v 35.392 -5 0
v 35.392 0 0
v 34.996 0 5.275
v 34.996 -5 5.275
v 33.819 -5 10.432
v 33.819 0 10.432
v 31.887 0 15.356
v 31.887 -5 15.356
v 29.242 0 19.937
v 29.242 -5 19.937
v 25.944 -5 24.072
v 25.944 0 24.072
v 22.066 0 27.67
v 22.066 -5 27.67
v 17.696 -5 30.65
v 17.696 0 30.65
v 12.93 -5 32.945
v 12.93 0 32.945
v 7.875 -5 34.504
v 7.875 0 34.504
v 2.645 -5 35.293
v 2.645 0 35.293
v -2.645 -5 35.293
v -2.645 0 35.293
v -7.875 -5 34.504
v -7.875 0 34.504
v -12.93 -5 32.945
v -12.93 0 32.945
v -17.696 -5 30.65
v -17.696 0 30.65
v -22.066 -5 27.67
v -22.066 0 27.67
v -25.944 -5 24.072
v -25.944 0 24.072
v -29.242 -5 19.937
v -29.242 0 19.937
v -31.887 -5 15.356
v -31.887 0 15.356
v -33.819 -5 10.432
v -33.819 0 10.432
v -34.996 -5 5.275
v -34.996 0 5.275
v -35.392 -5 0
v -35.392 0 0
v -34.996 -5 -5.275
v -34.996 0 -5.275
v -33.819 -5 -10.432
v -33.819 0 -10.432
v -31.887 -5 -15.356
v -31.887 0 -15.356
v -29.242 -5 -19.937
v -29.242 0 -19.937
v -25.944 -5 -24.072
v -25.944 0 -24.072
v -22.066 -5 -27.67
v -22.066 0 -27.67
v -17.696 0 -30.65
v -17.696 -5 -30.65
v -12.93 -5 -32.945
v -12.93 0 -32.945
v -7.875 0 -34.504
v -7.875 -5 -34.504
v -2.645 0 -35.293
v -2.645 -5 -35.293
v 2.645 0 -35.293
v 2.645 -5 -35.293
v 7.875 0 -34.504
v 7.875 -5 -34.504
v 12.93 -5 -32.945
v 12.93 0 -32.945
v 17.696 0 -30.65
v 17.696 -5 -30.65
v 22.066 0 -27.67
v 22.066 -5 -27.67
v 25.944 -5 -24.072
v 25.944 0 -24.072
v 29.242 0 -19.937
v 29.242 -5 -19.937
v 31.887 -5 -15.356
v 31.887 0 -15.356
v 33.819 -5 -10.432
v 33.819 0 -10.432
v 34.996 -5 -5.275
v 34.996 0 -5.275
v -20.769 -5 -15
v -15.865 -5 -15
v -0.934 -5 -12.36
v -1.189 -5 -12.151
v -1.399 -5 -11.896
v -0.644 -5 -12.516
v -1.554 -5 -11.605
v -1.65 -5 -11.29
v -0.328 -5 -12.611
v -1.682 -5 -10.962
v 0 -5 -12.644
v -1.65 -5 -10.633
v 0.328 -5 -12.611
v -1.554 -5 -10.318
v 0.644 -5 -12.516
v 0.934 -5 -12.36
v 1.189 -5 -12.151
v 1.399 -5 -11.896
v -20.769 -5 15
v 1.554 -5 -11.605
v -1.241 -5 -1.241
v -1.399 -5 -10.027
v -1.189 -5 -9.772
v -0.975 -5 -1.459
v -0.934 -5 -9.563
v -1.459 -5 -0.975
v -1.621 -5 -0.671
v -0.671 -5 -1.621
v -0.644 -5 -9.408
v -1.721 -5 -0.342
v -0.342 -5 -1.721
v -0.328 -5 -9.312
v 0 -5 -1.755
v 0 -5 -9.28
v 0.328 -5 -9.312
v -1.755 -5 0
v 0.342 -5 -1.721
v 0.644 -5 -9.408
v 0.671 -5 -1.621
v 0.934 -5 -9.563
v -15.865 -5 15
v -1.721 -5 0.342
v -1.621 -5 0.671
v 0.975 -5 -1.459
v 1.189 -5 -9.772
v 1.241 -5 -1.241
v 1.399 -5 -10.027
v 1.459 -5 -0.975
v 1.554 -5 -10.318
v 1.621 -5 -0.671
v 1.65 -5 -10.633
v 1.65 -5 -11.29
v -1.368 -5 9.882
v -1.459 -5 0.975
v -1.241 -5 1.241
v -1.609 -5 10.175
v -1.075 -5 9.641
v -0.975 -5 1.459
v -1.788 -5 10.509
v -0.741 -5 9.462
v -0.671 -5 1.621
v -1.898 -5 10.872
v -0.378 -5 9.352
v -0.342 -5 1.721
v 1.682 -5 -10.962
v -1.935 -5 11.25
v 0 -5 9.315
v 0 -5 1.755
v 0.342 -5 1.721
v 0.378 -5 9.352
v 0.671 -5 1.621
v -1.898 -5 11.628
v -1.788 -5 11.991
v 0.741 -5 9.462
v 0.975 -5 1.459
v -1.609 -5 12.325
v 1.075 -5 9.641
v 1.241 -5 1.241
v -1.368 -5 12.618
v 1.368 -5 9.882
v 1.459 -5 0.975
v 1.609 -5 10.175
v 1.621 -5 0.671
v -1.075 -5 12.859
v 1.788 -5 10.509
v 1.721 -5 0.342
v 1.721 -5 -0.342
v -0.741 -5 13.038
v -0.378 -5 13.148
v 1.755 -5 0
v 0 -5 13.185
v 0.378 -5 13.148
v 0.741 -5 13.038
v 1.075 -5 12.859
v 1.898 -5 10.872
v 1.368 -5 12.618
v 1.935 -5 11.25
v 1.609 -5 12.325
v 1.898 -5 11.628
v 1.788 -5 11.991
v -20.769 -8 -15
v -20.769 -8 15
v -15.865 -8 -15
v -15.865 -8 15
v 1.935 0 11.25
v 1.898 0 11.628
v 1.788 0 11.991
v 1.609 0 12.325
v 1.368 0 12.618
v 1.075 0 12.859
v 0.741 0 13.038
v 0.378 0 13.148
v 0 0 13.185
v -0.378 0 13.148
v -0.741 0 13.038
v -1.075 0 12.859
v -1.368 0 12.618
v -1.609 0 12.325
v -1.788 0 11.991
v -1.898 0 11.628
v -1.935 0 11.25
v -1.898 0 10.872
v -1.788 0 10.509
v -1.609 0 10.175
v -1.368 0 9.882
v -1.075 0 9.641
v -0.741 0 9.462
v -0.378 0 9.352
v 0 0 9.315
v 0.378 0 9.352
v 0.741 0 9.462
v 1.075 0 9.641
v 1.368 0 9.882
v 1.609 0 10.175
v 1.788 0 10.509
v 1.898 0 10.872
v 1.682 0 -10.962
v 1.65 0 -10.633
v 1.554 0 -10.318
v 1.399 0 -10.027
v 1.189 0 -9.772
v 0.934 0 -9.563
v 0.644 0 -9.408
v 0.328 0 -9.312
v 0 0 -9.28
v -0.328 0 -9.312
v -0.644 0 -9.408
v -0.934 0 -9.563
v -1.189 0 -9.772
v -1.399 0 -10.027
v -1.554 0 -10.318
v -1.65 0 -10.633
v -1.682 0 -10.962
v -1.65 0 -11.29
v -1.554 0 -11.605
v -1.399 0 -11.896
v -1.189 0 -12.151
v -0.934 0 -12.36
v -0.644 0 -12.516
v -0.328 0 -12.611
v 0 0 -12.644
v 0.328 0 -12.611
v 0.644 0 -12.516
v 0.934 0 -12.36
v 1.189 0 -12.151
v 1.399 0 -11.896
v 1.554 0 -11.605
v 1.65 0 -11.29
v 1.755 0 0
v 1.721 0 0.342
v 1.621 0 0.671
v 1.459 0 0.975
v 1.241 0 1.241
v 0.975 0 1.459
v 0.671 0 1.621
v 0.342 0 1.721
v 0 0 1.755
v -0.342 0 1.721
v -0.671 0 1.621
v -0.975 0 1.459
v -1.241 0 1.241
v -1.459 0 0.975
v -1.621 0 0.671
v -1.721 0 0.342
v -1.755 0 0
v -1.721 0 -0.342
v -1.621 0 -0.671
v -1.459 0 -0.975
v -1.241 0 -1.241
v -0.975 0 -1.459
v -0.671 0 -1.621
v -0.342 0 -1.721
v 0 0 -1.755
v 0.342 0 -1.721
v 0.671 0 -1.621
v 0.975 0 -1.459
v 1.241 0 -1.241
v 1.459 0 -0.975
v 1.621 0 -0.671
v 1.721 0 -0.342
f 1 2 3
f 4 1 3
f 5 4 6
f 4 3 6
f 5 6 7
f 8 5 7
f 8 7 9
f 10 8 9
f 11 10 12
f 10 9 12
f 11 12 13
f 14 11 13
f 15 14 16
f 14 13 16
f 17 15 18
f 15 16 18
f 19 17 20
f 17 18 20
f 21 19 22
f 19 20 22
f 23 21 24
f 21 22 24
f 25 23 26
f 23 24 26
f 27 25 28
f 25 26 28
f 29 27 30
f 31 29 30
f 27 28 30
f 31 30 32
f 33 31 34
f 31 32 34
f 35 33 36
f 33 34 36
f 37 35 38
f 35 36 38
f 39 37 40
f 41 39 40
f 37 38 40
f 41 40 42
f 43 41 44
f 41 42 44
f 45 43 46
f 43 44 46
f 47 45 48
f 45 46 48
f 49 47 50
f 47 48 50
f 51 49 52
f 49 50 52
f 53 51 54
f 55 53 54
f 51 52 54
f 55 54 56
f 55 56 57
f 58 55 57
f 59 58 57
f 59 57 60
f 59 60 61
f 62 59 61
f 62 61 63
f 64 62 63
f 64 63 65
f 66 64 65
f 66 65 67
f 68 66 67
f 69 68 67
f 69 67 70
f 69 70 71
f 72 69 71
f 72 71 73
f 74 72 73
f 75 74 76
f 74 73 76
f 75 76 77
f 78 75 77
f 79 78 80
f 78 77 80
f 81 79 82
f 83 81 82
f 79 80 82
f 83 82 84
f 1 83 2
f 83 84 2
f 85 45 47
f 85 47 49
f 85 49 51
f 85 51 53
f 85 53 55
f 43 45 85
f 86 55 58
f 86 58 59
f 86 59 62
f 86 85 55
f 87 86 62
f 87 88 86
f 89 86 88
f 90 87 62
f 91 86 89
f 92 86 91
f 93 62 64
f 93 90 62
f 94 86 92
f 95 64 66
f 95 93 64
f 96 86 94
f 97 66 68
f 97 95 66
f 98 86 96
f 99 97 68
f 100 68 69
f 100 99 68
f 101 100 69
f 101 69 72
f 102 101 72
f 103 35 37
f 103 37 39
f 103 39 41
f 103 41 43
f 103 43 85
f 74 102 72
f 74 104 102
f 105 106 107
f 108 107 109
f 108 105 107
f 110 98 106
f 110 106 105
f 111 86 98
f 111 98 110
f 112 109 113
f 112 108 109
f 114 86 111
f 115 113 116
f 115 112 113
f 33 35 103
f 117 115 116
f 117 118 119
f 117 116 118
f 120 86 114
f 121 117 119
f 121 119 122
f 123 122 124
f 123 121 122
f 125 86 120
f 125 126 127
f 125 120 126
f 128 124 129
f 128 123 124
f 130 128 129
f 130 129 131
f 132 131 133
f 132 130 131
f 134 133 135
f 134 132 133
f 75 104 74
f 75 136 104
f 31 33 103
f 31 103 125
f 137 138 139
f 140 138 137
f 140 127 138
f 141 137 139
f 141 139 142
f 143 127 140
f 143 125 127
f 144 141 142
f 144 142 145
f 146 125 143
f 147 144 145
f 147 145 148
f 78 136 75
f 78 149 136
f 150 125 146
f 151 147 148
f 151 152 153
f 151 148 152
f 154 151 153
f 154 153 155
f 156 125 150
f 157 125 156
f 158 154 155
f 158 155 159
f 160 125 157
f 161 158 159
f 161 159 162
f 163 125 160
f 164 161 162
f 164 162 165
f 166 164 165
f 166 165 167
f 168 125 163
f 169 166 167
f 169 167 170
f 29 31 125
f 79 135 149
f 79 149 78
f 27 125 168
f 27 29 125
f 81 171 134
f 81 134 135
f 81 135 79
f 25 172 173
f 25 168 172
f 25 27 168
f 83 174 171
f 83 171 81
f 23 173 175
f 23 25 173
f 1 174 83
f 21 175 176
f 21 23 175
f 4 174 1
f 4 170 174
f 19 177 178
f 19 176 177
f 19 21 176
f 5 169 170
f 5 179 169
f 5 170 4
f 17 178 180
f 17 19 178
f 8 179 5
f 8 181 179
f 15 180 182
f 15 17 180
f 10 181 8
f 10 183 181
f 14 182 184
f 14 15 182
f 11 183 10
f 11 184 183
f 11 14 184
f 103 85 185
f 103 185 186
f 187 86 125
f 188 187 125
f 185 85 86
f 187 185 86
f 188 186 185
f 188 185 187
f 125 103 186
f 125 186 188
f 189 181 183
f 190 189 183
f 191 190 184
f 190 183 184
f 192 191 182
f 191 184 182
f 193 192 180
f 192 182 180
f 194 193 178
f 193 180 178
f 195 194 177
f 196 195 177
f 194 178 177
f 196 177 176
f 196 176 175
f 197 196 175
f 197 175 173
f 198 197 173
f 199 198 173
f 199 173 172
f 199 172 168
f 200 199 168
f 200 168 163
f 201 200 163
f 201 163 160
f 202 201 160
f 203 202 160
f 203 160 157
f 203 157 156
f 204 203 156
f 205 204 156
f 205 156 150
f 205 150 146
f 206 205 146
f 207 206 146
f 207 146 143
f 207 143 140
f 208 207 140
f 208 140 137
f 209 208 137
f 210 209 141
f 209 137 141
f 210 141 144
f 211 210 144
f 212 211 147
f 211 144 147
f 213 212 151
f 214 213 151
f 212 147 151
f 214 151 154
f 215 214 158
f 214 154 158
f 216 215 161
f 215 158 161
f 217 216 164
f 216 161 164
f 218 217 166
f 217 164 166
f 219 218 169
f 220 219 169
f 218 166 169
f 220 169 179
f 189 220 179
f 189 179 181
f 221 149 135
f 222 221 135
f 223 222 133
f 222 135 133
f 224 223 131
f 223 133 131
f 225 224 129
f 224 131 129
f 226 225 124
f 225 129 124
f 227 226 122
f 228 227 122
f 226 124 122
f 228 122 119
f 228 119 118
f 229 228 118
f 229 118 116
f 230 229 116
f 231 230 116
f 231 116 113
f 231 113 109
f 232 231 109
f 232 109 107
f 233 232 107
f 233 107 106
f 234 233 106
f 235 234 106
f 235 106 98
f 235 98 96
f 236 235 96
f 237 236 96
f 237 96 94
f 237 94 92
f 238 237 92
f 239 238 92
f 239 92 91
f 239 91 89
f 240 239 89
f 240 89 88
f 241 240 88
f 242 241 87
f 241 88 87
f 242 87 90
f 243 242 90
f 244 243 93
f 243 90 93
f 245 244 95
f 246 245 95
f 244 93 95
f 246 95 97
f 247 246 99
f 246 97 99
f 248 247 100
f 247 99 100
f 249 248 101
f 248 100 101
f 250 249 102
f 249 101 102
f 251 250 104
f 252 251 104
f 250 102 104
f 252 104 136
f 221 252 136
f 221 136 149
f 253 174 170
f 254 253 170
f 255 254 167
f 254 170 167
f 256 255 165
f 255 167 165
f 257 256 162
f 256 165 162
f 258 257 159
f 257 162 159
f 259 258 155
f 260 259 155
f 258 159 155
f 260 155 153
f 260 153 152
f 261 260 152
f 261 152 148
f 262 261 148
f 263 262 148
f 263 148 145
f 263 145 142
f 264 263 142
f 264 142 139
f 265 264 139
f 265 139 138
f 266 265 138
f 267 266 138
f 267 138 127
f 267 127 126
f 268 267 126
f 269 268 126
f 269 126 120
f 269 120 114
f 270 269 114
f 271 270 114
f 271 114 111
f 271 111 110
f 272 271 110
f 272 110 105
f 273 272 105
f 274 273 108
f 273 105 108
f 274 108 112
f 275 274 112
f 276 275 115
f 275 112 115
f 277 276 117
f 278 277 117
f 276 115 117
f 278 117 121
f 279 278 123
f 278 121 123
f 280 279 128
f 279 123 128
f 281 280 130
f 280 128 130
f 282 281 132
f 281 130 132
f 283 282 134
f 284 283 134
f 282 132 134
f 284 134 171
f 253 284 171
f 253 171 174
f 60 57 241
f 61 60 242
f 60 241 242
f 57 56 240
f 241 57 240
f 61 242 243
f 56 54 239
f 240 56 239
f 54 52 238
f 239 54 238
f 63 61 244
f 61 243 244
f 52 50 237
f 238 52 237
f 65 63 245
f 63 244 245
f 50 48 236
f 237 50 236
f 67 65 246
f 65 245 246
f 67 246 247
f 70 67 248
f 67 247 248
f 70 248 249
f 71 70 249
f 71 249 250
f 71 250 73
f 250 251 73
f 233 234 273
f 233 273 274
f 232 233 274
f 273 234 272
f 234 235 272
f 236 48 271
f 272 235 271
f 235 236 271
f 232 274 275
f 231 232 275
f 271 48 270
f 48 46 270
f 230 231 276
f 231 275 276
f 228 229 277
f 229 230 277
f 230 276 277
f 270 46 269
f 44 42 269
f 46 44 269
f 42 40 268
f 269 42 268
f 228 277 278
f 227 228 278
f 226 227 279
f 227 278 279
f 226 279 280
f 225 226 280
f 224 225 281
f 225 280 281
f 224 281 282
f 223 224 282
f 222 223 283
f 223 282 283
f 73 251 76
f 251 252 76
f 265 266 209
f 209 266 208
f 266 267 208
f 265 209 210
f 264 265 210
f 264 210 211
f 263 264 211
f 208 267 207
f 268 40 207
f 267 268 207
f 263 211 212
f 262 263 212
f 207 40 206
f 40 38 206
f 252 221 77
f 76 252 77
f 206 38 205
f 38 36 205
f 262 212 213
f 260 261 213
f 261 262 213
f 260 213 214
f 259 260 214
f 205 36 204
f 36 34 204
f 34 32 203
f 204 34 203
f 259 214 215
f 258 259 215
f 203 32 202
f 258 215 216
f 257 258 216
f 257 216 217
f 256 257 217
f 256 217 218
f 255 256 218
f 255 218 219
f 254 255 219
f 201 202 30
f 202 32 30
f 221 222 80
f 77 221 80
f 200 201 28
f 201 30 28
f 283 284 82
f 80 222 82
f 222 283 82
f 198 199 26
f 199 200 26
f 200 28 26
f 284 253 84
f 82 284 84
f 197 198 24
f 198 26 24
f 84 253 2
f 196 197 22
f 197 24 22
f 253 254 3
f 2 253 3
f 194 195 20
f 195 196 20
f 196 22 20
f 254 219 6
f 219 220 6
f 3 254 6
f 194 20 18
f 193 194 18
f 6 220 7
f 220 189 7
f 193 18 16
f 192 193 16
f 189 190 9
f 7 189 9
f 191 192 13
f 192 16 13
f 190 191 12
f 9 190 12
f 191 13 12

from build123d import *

# Parameters (mm, degrees)
F0_R     = 35.391542
F1_DEPTH = 5
F3_R     = 1.682004
F4_DEPTH = 25
F5_R     = 1.935057
F6_DEPTH = 25
F7_R     = 1.754642
F8_DEPTH = 25
F2_W     = 4.903845
F2_H     = 30.000002
F9_DEPTH = 3


with BuildPart() as f1:
    # F0 (on Front) → F1 (new body)
    with BuildSketch(Plane.XZ):
        Circle(F0_R)
    extrude(amount=F1_DEPTH)

    # F3 (on face) → F4 (cut)
    with BuildSketch(Plane.XZ.offset(5)):
        with Locations((0, -10.961539)):
            Circle(F3_R)
    extrude(amount=-F4_DEPTH, mode=Mode.SUBTRACT)

    # F5 (on face) → F6 (cut)
    with BuildSketch(Plane.XZ.offset(5)):
        with Locations((0, 11.250001)):
            Circle(F5_R)
    extrude(amount=-F6_DEPTH, mode=Mode.SUBTRACT)

    # F7 (on face) → F8 (cut)
    with BuildSketch(Plane.XZ.offset(5)):
        Circle(F7_R)
    extrude(amount=-F8_DEPTH, mode=Mode.SUBTRACT)

    # F2 (on face) → F9 (join)
    with BuildSketch(Plane.XZ.offset(5)):
        with Locations((-18.317308, 0)):
            Rectangle(F2_W, F2_H)
    extrude(amount=F9_DEPTH)


solid = f1.part
